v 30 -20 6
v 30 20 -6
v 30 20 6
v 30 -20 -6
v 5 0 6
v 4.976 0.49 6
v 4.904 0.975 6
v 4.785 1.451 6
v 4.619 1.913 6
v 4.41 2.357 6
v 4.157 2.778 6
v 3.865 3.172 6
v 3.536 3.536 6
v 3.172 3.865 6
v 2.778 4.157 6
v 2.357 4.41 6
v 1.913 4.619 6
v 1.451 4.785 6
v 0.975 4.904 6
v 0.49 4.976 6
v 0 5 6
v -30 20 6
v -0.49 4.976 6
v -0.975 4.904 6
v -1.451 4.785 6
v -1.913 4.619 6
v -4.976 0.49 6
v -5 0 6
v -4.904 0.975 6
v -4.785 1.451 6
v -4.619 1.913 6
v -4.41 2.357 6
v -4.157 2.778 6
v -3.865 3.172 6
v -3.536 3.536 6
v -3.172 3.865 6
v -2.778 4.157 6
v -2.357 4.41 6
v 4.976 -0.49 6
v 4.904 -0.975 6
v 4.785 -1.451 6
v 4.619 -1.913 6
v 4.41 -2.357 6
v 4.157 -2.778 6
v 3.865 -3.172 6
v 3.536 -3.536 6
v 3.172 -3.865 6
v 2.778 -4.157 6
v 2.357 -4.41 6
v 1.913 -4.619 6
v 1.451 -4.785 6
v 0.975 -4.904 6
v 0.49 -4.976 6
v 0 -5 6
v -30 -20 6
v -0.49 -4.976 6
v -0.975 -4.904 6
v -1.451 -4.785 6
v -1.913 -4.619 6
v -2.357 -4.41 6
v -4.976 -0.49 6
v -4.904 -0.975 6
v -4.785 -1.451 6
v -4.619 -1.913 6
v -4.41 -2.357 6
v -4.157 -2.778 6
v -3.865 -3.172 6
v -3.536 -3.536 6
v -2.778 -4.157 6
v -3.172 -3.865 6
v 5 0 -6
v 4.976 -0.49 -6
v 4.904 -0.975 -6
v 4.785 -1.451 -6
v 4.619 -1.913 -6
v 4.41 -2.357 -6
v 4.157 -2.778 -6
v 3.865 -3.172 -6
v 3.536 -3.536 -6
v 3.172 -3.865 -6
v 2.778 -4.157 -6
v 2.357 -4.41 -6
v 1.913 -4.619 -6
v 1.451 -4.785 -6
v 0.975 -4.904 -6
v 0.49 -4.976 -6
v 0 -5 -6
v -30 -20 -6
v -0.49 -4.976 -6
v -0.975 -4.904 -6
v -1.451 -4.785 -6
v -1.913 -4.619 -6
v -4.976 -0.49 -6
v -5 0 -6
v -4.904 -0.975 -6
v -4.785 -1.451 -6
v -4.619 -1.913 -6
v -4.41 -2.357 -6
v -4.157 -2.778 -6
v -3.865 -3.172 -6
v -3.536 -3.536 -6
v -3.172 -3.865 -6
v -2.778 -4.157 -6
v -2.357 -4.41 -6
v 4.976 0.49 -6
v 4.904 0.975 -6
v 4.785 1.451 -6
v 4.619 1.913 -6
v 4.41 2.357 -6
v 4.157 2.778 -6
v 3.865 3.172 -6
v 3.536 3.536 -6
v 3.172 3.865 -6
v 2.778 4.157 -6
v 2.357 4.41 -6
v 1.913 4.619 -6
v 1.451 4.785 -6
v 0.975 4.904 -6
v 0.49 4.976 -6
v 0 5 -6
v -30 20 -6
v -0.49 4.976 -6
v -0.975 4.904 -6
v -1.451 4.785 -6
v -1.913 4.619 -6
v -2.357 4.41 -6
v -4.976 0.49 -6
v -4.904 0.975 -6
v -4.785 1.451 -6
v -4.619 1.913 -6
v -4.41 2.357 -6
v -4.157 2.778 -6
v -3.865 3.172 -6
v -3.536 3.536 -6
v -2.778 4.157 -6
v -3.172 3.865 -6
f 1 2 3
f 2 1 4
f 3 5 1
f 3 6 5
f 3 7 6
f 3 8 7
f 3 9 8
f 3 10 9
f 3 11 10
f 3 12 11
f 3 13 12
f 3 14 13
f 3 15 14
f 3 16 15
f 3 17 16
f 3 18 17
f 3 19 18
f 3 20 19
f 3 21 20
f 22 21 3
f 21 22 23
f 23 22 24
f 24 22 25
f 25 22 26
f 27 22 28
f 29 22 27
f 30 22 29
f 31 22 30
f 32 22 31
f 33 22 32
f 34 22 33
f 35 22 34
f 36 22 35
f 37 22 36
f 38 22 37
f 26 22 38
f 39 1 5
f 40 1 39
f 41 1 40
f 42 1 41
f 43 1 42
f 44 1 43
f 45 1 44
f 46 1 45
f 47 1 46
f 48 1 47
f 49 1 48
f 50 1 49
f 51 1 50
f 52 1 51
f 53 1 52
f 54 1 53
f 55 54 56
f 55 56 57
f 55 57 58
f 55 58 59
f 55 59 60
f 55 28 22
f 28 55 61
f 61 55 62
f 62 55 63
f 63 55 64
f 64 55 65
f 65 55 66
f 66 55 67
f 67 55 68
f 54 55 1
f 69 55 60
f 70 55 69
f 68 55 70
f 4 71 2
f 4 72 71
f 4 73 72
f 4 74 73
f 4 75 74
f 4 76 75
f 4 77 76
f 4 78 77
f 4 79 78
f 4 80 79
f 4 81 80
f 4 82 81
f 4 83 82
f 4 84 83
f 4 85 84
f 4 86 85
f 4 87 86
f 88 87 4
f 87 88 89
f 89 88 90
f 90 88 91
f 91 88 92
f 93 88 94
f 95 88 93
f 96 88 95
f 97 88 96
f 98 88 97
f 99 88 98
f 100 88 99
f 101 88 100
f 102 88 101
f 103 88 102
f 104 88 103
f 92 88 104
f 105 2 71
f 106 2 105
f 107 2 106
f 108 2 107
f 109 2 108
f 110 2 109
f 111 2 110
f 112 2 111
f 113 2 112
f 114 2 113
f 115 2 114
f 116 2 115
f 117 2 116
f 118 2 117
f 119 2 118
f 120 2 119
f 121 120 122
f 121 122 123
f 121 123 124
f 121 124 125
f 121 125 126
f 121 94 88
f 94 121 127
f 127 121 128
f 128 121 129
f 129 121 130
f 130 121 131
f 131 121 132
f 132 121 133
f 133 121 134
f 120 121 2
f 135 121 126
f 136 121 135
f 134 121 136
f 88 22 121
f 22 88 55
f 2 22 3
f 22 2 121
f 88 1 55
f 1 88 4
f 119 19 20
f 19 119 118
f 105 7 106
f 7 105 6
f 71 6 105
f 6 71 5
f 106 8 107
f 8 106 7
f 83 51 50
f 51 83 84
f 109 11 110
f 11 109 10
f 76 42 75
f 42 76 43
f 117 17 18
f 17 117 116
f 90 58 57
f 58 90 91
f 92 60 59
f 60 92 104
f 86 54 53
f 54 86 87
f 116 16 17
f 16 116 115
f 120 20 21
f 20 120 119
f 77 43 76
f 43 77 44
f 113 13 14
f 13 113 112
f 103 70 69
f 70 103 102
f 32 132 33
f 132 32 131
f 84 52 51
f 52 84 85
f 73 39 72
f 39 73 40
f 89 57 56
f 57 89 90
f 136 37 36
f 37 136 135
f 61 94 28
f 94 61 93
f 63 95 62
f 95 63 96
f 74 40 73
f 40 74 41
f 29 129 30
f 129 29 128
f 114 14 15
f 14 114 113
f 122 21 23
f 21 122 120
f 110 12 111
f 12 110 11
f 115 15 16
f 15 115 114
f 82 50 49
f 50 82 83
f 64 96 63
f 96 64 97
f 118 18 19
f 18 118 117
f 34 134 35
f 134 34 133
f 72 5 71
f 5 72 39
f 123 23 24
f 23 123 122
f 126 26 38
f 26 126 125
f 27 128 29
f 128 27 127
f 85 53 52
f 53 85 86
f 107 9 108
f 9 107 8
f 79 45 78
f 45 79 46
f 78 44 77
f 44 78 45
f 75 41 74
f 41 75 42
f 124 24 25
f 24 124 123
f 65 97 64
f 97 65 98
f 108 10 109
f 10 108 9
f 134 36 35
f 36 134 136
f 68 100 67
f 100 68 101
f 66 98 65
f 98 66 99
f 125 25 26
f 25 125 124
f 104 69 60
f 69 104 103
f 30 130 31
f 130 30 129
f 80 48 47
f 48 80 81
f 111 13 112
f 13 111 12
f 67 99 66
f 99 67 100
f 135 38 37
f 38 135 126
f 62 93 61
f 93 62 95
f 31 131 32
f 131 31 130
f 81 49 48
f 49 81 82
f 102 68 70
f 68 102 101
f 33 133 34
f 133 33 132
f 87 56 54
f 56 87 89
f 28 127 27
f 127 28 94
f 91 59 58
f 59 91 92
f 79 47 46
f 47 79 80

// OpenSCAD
// Parametric Source File for: main outer chassis casing
// Generated via Sol-5.6-Max-PyOrch CAD Agent
// Component ID: COMP-FE73BA
// Material hint: PLA | Mechanical profile: structural
// Suggested wall_loops from DFM: 4

$fn = 64; // Render resolution
hole_compensation = 0.00; // Dynamic FDM printer gap adjustment

body_w = 60.0;
body_d = 40.0;
body_h = 12.0;
bore_r = 5.0;

module generate_main_outer_chassis_casing_model() {
    difference() {
        // Core structural bounding hull (parametric)
        cube([body_w, body_d, body_h], center = true);

        // Dynamic interlocking peg / clearance track
        translate([0, 0, 0])
            cylinder(h = body_h + 2, r = bore_r + hole_compensation, center = true);
    }
}

generate_main_outer_chassis_casing_model();
